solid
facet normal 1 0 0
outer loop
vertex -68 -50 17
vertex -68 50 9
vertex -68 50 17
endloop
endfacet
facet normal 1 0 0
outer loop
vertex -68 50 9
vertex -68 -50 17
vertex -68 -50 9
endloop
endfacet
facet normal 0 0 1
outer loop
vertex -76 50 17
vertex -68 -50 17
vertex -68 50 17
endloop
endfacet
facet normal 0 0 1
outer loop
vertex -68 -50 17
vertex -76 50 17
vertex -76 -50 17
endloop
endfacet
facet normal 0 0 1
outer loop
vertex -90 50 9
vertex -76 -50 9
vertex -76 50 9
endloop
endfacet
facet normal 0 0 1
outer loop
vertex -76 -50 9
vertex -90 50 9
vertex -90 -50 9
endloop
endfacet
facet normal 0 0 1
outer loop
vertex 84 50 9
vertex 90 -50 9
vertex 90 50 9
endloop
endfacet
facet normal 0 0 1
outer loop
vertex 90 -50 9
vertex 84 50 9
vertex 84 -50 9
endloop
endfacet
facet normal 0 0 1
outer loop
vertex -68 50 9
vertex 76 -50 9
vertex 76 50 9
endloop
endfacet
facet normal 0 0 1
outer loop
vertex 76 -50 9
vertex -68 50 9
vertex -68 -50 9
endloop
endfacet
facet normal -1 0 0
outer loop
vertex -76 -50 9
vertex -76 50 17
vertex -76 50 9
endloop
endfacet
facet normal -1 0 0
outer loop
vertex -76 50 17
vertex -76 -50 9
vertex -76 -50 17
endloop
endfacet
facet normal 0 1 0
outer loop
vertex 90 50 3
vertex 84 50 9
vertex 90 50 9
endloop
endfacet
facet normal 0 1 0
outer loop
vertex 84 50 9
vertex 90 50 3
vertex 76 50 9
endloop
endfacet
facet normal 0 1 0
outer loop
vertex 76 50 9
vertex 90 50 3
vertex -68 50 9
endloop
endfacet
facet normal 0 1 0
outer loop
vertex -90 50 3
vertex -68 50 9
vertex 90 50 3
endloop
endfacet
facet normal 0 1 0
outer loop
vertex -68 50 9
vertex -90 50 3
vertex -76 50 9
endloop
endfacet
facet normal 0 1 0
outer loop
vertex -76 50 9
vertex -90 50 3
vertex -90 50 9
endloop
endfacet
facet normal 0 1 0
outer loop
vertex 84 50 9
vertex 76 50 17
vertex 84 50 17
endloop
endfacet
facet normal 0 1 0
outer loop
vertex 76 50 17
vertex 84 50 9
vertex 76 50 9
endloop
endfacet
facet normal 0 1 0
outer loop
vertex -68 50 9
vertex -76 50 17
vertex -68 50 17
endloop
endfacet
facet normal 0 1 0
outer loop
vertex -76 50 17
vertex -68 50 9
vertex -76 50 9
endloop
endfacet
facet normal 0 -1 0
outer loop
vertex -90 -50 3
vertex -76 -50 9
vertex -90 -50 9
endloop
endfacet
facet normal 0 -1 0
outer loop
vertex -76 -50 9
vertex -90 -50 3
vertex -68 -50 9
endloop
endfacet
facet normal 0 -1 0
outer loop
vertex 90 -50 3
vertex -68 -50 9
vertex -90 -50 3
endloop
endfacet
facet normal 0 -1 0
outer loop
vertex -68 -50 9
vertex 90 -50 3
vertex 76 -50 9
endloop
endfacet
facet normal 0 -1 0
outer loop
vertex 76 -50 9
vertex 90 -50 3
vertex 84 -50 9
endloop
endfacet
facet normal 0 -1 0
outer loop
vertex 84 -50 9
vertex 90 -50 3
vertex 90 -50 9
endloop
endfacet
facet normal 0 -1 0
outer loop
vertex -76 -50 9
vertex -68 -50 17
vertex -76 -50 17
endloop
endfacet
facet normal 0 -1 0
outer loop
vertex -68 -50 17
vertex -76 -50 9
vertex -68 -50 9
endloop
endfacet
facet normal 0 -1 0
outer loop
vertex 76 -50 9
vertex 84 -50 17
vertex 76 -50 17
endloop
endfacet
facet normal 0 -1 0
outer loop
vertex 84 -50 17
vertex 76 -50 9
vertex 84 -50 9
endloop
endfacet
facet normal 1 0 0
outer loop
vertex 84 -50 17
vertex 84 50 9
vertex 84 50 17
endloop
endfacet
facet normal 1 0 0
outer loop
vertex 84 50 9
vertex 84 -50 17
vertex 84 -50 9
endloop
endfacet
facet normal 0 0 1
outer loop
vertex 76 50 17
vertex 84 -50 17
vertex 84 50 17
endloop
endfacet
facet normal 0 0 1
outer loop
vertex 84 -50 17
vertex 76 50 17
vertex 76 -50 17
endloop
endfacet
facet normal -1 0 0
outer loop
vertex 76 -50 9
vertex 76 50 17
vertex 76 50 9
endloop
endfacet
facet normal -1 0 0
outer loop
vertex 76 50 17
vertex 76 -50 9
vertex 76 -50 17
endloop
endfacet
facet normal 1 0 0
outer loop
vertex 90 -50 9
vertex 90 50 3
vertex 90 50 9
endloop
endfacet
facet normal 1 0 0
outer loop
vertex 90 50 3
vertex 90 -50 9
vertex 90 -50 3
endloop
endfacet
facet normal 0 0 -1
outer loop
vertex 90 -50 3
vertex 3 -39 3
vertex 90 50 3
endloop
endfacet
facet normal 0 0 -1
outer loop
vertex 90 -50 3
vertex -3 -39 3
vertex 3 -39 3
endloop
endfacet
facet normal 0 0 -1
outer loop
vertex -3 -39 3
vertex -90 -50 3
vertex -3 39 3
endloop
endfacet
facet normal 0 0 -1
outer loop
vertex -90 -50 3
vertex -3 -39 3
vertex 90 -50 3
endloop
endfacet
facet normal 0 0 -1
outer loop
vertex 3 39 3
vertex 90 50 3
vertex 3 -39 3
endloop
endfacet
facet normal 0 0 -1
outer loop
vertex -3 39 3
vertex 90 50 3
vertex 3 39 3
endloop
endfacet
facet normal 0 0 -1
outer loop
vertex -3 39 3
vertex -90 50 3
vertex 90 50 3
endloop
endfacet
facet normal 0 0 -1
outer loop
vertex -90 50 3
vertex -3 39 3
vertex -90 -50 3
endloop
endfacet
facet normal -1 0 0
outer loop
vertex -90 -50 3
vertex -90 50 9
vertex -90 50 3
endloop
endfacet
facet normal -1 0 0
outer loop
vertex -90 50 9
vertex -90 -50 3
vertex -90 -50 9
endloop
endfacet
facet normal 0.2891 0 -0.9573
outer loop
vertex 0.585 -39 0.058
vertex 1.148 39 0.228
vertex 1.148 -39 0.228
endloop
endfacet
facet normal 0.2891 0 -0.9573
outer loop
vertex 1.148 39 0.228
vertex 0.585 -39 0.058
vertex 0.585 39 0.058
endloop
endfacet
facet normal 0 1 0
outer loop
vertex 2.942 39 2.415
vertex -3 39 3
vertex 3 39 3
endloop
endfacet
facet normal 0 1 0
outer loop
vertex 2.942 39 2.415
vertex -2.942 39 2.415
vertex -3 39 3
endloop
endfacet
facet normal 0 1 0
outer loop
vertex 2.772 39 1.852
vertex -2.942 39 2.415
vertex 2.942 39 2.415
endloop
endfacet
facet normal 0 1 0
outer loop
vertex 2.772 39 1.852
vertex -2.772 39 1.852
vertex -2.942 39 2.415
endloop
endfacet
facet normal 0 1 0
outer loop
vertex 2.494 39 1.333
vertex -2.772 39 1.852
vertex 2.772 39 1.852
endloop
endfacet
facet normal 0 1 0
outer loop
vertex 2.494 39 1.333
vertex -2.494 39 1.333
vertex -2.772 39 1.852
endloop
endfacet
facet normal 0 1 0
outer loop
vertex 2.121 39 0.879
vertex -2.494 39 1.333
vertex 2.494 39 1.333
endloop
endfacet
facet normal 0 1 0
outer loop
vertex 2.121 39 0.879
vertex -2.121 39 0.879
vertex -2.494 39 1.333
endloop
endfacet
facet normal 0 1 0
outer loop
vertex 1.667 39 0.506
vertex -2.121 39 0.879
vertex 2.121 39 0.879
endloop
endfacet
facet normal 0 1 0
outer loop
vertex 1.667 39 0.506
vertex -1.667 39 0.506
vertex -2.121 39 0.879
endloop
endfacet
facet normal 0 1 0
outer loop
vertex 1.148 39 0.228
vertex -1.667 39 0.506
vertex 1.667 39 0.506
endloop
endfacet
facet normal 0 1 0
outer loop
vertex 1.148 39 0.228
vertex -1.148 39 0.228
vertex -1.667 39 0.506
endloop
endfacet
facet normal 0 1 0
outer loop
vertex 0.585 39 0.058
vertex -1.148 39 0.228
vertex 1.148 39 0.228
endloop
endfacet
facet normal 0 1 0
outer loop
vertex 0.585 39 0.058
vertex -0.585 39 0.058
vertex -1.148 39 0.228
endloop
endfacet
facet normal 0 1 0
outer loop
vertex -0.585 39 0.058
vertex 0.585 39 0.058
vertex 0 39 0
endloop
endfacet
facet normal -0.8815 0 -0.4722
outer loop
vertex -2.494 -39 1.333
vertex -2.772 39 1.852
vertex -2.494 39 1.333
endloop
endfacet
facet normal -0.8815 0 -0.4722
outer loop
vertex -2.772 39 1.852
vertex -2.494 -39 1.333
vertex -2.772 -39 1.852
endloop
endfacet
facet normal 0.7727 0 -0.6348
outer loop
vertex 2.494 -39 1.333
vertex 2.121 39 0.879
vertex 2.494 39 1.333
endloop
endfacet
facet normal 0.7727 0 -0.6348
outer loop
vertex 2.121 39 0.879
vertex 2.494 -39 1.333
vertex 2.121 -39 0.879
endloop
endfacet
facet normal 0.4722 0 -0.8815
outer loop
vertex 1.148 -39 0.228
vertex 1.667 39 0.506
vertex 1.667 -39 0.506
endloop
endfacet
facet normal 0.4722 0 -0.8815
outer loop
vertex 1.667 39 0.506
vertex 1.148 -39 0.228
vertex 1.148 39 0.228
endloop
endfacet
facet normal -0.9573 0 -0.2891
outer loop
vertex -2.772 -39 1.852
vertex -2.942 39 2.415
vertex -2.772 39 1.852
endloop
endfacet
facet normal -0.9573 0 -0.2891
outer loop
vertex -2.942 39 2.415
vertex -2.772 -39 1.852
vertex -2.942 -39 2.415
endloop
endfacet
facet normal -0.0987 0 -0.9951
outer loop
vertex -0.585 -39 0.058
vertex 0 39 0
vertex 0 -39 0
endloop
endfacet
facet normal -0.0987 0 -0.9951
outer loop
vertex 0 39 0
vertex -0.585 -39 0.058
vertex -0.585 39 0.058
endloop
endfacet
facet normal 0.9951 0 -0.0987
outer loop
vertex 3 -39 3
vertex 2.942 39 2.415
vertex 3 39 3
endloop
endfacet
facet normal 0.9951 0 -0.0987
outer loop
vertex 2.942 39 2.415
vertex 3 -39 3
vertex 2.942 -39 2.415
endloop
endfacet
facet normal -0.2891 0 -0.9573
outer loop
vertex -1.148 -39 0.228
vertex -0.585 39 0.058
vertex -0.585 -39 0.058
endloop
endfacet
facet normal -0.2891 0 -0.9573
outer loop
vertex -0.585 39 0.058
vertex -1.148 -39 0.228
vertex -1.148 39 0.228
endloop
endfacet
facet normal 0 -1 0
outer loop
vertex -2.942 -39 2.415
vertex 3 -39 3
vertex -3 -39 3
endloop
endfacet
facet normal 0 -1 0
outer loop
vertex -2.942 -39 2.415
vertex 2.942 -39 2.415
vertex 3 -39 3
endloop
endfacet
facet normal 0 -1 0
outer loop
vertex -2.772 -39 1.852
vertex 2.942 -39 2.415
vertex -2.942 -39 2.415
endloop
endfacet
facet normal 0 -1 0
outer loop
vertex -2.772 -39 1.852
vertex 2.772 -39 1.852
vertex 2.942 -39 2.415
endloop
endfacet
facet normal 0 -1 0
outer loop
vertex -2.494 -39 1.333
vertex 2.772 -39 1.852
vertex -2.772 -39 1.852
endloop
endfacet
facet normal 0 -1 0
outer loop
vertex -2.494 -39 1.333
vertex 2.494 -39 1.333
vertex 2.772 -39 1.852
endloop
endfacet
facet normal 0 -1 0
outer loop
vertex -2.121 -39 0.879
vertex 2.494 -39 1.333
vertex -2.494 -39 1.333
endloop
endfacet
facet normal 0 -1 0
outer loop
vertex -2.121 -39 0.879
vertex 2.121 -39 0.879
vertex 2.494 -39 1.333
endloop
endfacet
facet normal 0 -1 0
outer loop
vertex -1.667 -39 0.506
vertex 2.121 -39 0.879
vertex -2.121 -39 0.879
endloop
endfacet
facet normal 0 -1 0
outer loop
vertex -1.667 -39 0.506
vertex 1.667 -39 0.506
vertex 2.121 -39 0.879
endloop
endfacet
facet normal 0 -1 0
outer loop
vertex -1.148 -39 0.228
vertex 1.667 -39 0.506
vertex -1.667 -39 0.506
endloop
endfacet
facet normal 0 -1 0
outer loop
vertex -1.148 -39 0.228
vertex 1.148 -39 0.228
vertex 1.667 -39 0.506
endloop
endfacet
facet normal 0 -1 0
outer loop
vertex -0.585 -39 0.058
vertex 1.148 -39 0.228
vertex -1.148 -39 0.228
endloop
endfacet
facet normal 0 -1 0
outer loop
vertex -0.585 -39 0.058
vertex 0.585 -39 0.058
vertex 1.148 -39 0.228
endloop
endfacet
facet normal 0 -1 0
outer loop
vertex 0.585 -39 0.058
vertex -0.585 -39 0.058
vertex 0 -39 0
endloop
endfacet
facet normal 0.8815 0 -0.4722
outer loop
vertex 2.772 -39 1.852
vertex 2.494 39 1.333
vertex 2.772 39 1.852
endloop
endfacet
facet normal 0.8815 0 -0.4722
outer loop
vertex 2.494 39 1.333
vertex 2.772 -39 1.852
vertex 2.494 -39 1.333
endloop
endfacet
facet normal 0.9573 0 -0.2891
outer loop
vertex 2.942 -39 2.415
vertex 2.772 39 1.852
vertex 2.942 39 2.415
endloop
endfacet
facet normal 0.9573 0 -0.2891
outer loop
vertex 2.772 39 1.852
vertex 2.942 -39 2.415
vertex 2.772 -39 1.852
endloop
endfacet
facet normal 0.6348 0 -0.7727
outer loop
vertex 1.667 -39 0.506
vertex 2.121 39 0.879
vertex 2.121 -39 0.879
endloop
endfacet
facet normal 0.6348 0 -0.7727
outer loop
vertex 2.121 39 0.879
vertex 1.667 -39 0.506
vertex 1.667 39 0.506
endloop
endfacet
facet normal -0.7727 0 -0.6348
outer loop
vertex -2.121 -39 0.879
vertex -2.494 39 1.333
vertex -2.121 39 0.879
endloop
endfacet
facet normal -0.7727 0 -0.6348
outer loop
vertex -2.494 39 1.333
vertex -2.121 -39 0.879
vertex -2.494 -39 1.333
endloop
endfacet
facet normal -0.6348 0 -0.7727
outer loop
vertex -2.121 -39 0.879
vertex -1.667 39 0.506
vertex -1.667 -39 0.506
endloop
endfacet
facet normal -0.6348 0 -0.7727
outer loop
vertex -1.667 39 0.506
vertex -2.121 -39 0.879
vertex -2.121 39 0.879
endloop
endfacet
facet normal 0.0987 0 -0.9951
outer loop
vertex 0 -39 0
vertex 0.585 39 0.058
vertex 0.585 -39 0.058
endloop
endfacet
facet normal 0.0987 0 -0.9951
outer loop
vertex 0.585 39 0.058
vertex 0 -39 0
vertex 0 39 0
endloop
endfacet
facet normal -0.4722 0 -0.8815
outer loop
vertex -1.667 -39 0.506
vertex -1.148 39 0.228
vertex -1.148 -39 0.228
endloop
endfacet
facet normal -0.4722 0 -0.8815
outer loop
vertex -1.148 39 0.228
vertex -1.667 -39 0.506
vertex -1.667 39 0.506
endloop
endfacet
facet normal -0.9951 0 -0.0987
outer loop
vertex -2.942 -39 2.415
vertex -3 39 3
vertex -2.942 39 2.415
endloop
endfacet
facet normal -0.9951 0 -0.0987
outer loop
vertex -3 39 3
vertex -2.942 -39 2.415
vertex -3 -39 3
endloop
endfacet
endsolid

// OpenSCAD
deck_length=180; deck_depth=100; deck_thickness=6; axle_diameter=6; axle_length=78;
module seesaw_deck(){ union(){ translate([-deck_length/2,-deck_depth/2,3]) cube([deck_length,deck_depth,deck_thickness]); translate([0,0,3]) rotate([90,0,0]) cylinder(d=axle_diameter,h=axle_length,center=true,$fn=32); for(x=[-76,76]) translate([x,-deck_depth/2,9]) cube([8,deck_depth,8]); }}
assert(deck_length==180 && axle_diameter==6); echo("SCADCTL_REQUIREMENT:parameters:PASS"); seesaw_deck();
